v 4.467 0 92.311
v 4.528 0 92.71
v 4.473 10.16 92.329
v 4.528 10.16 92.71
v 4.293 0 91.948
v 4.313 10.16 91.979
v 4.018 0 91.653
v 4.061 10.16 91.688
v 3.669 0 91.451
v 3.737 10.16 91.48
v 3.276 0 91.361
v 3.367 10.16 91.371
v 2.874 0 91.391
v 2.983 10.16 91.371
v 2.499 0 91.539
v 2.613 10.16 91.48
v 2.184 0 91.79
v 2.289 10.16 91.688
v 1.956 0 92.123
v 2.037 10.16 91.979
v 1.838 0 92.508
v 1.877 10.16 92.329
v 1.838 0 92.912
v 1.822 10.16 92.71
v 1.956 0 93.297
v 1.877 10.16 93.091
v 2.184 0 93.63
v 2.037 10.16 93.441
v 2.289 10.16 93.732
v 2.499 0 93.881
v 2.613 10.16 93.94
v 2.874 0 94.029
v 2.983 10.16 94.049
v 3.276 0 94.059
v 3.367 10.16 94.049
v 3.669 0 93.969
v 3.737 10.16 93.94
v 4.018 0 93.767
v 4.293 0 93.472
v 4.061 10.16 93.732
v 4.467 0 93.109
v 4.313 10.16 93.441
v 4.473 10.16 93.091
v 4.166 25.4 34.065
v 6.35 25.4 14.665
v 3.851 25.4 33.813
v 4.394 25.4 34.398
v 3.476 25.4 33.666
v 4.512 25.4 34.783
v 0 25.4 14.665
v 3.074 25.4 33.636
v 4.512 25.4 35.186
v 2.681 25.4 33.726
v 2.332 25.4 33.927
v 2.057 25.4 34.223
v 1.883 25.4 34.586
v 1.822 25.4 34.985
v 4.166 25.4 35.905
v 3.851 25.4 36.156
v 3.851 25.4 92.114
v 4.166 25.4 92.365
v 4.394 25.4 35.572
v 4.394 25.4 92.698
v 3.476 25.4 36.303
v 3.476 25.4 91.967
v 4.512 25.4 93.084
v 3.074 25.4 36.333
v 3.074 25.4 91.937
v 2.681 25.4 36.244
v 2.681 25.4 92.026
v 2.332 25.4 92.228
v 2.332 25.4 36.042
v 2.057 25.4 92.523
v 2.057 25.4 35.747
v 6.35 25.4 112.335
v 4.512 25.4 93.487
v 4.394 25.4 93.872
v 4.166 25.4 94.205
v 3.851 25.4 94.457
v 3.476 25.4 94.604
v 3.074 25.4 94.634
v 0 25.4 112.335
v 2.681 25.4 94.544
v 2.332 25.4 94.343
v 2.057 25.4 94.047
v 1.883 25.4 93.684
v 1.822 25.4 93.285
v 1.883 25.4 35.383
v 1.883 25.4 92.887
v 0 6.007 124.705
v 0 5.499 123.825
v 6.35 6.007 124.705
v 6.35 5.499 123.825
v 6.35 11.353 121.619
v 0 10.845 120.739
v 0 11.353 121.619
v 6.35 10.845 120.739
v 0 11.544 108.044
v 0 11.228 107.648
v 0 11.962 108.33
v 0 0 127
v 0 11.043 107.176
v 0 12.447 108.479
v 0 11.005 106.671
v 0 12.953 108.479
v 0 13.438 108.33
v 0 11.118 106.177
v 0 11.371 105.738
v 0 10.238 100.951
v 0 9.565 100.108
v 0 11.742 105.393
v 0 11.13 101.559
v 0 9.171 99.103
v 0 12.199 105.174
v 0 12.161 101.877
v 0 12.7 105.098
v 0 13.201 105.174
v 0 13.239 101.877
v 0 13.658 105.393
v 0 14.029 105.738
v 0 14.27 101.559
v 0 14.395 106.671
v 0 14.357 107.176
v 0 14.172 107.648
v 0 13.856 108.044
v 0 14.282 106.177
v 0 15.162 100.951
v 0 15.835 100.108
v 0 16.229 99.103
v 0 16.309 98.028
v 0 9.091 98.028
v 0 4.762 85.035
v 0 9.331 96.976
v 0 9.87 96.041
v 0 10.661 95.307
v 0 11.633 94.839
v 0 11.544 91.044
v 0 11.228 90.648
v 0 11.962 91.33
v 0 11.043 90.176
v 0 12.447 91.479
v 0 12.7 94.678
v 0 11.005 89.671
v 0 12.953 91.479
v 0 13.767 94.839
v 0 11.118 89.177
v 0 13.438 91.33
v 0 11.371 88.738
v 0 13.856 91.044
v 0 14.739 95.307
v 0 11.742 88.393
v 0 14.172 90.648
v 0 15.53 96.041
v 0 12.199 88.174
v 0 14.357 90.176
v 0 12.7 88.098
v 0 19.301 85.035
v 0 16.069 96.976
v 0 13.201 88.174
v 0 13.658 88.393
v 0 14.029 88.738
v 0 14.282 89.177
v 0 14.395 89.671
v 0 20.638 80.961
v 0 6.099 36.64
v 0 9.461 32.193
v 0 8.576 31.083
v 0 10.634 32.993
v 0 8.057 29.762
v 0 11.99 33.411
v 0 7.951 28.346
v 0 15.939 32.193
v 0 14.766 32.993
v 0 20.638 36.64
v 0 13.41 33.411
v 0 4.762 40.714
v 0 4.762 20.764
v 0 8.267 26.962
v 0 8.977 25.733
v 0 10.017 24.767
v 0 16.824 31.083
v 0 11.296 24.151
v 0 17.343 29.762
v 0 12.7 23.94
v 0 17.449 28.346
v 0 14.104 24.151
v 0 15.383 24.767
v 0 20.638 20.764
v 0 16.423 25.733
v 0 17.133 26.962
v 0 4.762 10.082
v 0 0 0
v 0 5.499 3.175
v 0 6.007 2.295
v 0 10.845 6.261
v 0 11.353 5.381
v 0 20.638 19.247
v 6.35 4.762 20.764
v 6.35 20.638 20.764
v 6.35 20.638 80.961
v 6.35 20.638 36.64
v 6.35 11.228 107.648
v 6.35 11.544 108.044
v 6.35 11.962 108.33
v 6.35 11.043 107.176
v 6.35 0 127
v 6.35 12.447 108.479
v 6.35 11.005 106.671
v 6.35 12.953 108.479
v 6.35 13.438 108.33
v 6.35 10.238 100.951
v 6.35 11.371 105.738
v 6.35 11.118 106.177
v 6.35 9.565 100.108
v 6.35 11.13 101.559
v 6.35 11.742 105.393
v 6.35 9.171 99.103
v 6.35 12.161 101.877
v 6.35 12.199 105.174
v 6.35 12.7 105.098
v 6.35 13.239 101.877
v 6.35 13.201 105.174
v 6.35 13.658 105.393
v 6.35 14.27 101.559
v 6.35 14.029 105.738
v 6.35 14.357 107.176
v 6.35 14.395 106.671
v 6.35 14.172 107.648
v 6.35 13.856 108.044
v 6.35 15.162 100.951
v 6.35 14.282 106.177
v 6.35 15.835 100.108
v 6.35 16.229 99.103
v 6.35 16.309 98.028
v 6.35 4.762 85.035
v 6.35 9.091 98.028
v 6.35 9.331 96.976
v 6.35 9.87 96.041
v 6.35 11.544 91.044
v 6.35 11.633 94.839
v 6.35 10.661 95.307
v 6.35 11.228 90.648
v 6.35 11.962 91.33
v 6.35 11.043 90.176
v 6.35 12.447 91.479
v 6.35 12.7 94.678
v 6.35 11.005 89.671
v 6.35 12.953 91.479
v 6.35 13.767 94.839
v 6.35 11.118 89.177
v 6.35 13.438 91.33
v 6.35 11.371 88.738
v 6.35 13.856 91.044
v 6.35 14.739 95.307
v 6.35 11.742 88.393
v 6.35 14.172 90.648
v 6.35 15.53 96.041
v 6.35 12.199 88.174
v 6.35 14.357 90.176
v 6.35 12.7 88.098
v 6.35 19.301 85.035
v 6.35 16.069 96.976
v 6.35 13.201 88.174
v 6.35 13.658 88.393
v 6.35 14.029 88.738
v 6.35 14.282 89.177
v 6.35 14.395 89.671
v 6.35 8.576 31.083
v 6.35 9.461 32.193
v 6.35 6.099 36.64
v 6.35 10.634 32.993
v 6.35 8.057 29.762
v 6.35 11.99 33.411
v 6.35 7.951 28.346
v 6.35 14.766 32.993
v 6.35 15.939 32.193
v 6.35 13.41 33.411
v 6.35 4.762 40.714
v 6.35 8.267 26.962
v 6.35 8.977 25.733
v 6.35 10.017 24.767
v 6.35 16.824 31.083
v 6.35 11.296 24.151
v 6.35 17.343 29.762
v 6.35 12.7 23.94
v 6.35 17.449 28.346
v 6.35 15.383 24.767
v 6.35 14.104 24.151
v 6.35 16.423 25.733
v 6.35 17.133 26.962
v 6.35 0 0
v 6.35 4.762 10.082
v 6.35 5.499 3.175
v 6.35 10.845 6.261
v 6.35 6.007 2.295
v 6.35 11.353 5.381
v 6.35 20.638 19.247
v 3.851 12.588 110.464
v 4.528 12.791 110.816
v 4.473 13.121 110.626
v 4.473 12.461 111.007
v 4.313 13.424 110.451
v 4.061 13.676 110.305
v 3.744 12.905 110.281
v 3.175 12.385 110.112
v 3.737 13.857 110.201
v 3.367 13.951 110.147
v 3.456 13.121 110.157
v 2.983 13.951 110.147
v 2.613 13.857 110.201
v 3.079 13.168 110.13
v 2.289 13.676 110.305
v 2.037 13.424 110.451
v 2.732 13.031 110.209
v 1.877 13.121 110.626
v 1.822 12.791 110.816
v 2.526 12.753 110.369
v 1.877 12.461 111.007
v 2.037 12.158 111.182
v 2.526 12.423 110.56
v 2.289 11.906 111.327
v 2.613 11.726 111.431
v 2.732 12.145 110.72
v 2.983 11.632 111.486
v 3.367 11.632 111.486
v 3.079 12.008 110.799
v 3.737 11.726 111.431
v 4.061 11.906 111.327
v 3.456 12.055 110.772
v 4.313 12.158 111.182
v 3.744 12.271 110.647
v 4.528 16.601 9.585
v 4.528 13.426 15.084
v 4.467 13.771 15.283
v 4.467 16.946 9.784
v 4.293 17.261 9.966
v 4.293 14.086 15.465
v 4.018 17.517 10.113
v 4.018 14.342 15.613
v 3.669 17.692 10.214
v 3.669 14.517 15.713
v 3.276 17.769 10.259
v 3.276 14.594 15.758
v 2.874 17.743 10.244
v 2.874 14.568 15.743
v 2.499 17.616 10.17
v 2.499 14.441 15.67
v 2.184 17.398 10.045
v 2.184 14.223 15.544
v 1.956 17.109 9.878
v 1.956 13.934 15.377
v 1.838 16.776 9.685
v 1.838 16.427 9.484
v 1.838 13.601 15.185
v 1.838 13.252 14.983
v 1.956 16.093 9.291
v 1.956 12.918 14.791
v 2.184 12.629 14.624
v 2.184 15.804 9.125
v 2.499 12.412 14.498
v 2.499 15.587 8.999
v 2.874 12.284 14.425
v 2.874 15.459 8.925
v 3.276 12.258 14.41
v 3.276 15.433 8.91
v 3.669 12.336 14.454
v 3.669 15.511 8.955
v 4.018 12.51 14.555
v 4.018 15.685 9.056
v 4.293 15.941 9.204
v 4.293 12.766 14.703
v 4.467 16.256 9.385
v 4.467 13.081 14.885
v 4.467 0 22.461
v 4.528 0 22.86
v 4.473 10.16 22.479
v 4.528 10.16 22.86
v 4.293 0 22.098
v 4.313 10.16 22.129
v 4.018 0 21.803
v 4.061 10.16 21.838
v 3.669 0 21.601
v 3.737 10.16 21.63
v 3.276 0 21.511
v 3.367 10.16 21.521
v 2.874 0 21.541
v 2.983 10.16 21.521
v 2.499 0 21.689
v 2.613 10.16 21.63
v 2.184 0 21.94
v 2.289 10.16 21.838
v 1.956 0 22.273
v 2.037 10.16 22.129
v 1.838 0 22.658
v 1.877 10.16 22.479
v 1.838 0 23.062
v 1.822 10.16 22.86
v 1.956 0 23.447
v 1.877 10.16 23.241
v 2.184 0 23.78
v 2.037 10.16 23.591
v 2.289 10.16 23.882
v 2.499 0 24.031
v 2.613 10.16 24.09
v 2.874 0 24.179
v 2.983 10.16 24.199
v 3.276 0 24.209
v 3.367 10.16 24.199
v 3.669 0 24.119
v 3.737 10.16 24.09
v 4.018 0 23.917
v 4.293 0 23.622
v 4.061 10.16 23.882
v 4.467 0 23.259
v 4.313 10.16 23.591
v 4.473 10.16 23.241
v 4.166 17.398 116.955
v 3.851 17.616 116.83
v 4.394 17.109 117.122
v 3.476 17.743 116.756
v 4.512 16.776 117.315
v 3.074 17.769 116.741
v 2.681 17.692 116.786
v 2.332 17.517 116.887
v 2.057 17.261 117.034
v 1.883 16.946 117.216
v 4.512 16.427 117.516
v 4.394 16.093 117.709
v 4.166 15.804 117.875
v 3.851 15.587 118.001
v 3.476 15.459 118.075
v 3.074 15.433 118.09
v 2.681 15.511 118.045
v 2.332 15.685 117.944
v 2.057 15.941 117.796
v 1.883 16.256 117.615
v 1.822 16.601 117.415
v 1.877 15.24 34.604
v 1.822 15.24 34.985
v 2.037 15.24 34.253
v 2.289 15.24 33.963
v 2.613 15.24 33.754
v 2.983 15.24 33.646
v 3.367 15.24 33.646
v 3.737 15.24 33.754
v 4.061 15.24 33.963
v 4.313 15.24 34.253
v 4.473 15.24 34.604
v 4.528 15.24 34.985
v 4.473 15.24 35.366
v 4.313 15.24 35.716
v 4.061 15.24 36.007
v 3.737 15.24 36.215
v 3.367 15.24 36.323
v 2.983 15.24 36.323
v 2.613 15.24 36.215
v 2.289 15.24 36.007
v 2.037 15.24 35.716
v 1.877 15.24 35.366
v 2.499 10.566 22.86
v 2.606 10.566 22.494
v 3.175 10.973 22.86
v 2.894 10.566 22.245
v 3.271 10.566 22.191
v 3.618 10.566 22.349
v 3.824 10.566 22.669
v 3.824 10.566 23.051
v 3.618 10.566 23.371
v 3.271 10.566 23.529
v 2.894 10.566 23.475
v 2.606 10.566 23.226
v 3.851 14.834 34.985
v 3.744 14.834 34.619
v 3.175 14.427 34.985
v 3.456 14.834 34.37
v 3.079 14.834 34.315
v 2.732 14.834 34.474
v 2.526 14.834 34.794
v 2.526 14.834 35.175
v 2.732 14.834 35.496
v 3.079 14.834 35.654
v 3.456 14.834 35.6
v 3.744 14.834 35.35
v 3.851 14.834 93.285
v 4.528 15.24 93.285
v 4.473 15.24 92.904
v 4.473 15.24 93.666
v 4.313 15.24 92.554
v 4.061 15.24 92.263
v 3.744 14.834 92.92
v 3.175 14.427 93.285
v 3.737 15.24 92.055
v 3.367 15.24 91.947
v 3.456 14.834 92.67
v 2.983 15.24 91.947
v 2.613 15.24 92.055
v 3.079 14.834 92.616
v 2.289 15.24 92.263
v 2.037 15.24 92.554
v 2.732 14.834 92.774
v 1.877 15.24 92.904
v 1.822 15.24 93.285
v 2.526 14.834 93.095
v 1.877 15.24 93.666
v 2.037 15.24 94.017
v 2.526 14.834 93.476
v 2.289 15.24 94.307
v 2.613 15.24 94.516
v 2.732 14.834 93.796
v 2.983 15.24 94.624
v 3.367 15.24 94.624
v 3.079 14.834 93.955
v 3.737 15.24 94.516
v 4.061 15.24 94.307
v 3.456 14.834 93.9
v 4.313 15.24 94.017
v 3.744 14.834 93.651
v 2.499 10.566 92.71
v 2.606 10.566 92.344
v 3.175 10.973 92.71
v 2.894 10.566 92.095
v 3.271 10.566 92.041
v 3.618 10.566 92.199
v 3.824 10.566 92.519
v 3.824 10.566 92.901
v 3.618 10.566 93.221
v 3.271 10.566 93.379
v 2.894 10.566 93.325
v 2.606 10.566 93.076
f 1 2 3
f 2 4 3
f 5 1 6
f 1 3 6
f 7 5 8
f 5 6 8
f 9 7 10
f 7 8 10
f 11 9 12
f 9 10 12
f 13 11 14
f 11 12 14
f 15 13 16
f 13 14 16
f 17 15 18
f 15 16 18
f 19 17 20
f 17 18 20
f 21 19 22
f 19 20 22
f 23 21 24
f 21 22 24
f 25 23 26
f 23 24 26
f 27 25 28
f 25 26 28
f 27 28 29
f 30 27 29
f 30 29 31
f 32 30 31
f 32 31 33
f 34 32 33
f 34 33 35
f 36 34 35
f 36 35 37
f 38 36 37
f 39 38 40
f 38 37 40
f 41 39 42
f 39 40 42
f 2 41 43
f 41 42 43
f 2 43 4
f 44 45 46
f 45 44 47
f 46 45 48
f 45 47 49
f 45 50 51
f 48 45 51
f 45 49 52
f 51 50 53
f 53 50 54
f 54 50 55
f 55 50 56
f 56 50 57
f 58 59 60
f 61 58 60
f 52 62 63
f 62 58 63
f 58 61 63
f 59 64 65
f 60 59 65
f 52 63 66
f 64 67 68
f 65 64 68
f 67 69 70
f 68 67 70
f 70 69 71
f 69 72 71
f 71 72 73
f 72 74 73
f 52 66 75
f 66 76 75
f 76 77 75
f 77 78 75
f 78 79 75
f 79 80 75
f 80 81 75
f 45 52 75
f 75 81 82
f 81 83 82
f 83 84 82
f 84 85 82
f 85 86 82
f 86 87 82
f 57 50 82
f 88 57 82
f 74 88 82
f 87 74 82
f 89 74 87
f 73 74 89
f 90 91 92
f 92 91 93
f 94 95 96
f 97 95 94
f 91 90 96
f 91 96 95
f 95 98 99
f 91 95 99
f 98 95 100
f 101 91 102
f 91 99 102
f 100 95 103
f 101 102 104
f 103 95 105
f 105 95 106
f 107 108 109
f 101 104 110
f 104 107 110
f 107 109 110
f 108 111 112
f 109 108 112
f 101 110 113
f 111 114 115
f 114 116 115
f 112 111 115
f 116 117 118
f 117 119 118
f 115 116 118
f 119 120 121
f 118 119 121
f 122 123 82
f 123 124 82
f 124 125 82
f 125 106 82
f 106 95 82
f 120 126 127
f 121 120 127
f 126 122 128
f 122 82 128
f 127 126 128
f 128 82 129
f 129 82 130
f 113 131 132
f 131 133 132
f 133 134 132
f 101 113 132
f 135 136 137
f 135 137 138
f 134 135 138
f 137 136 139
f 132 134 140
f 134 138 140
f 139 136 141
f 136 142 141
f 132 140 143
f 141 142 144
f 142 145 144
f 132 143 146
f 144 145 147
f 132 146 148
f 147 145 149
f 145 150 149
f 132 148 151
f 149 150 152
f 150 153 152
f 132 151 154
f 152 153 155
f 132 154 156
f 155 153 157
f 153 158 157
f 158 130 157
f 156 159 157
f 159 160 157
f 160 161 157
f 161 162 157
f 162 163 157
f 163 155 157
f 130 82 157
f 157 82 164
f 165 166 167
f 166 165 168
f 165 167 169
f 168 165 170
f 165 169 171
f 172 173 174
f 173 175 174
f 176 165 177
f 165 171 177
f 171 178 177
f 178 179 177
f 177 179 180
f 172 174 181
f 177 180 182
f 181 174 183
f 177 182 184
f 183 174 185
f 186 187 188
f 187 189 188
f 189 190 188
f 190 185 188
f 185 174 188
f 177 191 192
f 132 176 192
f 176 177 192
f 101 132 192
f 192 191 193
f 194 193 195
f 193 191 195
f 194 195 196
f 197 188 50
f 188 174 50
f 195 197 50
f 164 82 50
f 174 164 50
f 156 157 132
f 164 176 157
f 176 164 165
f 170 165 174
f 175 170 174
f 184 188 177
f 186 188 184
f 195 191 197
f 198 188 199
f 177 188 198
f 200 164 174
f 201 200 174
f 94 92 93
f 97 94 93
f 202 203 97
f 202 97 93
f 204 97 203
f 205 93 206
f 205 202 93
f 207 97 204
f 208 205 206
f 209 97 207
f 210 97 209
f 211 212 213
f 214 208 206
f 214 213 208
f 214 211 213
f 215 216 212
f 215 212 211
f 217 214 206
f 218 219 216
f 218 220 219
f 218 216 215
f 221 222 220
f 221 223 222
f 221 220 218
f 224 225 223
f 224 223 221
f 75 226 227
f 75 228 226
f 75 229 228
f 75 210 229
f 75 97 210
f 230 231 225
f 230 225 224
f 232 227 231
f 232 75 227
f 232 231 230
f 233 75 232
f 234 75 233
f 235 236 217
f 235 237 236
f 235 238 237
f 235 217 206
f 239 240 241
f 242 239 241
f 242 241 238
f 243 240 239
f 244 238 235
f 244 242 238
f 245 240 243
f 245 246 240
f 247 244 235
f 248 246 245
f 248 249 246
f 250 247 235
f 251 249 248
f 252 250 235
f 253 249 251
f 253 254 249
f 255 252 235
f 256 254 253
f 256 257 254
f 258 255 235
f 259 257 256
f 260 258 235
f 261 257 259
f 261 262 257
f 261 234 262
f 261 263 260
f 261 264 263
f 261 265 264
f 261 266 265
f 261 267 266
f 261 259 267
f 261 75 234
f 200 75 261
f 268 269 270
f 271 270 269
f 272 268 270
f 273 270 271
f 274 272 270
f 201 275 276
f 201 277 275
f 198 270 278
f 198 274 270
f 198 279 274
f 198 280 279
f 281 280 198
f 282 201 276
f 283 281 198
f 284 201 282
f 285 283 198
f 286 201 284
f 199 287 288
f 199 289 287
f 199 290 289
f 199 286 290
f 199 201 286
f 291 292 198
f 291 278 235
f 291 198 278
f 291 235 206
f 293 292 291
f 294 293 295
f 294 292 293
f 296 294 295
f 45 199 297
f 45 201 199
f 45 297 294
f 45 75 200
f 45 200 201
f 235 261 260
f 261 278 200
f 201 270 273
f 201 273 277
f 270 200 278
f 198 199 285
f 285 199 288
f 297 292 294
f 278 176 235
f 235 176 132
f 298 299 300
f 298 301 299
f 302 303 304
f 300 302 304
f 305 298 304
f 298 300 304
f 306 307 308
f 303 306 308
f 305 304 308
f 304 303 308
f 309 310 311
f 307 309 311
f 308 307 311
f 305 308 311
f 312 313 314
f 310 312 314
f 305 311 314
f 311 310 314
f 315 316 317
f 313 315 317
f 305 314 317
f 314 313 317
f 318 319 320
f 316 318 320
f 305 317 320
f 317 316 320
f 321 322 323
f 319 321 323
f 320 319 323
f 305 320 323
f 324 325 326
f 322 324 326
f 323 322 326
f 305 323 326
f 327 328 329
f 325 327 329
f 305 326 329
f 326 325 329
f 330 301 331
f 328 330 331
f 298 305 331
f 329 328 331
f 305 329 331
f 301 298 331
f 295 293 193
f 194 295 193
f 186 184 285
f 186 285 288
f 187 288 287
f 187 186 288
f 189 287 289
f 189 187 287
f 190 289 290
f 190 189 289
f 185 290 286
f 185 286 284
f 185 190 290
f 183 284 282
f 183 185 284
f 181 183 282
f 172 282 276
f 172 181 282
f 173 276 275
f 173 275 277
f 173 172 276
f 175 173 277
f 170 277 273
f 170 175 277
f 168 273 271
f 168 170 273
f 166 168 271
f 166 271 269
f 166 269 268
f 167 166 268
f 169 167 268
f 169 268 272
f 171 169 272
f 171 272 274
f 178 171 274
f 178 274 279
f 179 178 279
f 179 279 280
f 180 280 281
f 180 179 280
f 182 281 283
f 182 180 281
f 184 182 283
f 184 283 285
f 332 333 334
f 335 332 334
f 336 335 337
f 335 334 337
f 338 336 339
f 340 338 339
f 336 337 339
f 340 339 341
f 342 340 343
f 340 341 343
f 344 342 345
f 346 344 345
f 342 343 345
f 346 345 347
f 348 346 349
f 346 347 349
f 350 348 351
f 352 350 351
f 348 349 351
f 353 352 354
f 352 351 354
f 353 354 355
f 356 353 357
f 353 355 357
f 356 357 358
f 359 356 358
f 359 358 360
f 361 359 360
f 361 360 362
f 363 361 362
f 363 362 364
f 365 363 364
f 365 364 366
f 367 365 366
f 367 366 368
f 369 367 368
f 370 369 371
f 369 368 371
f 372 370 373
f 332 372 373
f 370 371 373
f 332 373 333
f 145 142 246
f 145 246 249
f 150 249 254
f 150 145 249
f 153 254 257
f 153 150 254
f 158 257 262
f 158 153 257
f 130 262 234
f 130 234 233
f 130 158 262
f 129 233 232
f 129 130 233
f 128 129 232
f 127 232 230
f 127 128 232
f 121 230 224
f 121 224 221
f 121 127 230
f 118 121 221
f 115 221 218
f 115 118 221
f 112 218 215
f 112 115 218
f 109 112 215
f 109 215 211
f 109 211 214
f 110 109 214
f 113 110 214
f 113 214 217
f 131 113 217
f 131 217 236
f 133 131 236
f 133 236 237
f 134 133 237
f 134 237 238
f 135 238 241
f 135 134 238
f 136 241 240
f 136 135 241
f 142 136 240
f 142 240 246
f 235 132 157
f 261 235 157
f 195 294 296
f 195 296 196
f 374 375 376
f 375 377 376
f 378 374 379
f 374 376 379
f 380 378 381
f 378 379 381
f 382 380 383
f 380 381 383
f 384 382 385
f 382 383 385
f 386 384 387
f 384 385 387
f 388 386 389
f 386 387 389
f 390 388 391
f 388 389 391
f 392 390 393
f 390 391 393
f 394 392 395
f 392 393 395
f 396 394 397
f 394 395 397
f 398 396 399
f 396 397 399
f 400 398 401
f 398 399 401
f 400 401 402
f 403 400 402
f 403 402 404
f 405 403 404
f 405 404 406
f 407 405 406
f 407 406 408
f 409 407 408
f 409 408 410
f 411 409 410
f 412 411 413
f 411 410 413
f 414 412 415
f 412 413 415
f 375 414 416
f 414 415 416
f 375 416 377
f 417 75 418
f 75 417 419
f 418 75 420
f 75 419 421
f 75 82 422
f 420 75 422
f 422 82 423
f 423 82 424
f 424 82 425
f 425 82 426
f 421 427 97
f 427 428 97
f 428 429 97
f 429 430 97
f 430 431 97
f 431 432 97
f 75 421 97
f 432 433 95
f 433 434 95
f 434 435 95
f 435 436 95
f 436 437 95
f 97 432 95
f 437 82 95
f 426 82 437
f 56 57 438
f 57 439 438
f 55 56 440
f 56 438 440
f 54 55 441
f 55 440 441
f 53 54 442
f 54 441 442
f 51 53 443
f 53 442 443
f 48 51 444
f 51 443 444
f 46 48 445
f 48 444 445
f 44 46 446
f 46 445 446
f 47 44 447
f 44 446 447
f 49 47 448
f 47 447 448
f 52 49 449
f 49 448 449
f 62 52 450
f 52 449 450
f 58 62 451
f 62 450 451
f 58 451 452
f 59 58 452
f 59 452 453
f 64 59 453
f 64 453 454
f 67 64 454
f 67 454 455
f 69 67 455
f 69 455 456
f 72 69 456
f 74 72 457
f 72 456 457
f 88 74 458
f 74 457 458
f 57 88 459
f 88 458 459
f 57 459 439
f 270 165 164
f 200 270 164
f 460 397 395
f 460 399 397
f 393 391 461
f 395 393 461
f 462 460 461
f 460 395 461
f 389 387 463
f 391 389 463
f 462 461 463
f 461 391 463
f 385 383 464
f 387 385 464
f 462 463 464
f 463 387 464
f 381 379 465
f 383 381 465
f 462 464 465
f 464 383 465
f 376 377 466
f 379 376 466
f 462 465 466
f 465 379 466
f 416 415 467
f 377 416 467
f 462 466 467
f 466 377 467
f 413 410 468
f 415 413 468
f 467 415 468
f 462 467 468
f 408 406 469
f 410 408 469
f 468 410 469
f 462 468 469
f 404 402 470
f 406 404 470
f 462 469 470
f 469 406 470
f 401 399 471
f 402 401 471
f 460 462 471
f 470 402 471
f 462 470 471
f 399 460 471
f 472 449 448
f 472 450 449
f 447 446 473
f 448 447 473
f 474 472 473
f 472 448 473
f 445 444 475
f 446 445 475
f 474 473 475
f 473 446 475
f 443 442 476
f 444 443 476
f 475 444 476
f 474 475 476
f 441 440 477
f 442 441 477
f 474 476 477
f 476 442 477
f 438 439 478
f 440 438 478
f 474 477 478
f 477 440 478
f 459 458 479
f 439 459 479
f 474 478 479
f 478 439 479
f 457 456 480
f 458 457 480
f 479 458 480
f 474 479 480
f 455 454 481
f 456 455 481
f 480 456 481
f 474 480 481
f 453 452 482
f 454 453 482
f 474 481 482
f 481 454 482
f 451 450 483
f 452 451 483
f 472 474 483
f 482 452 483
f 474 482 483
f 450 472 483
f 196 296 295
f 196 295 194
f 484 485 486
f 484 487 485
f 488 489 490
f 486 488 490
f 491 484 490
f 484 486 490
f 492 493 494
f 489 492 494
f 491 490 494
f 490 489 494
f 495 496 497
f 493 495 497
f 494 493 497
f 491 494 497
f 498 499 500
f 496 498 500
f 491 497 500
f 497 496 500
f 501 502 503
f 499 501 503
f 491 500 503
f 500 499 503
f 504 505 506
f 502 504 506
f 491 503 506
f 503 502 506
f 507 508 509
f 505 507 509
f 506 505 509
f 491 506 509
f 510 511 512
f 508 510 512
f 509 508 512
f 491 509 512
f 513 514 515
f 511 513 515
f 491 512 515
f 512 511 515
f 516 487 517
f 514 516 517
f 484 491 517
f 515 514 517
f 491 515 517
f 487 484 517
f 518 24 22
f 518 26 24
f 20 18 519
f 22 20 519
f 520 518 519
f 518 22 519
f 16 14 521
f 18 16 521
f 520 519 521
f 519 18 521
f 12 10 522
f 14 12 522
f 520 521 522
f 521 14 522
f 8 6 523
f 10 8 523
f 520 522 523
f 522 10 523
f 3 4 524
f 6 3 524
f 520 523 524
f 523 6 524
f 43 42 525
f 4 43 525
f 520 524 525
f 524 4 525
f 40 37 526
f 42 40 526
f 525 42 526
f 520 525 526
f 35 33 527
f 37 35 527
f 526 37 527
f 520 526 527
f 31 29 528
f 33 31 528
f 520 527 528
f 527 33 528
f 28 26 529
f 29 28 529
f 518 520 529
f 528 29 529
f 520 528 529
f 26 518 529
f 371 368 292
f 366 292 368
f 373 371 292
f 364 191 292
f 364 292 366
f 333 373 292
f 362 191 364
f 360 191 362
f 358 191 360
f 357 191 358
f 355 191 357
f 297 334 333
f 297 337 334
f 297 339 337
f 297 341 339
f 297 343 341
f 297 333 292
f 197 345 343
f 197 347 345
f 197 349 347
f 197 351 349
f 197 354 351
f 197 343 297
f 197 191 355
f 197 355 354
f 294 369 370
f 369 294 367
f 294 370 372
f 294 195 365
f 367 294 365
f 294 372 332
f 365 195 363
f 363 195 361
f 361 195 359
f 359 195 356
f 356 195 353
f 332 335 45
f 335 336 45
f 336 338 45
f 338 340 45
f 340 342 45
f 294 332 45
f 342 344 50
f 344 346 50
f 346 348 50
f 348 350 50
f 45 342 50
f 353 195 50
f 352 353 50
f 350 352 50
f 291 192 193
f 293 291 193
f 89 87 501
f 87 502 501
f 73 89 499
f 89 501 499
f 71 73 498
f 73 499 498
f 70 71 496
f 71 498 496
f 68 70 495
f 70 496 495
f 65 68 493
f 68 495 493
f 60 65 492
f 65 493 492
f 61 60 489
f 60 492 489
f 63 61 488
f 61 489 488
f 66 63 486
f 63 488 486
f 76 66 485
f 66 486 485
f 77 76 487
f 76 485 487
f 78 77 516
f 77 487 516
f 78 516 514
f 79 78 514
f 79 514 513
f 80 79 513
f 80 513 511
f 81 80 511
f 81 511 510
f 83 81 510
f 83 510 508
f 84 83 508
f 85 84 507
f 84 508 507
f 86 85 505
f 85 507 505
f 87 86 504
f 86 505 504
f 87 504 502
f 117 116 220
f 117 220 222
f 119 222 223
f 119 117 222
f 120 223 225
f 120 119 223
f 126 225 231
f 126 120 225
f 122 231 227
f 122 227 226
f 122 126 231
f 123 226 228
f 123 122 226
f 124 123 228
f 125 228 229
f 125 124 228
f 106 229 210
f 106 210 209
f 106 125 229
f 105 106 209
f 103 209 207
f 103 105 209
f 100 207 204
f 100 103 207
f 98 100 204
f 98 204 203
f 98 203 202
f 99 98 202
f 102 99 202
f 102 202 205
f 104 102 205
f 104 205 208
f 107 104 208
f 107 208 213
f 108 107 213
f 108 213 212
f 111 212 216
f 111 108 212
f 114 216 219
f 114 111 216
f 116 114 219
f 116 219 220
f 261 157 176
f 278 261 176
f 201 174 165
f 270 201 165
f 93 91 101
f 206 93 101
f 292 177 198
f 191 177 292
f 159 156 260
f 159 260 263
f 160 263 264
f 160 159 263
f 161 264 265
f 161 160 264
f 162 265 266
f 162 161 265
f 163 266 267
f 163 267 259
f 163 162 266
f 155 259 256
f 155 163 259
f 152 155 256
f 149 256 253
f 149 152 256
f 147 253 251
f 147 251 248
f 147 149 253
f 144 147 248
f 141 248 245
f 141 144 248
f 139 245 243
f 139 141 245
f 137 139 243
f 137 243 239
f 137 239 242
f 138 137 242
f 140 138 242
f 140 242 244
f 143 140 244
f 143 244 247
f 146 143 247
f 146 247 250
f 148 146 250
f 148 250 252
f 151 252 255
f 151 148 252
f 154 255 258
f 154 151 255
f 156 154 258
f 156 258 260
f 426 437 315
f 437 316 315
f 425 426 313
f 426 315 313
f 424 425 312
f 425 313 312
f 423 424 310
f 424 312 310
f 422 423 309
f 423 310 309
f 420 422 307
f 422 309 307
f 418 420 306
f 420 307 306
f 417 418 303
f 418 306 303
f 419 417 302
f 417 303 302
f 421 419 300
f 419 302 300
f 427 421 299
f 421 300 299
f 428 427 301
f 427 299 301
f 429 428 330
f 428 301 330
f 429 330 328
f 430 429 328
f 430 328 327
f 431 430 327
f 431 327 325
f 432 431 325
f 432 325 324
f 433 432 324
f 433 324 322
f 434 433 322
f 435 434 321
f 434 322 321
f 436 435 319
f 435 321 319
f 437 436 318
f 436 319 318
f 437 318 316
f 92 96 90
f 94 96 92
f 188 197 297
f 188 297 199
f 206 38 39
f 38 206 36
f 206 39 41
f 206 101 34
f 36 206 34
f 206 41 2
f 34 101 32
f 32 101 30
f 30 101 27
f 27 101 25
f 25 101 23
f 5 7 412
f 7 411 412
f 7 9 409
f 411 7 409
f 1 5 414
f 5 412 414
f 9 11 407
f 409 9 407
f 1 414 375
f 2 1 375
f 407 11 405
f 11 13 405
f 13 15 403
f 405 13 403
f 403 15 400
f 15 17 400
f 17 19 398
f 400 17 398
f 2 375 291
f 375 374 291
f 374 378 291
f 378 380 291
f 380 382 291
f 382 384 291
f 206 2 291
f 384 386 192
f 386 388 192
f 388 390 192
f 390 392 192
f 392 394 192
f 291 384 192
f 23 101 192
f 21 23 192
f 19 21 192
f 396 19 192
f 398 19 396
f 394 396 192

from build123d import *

# Parameters (mm, degrees)
SKETCH1_R                     = 3.6195
SKETCH1_R_2                   = 4.7625
SKETCH1_R_3                   = 1.6999966
BOSS_EXTRUDE1_DEPTH           = 6.35
TAP_DRILL_FOR_6_32_TAP4_D     = 2.7051
TAP_DRILL_FOR_6_32_TAP4_DEPTH = 10.16
TAP_DRILL_FOR_6_32_TAP4_TIP   = 0.81269403
TAP_DRILL_FOR_6_32_TAP3_D     = 2.7051
TAP_DRILL_FOR_6_32_TAP3_DEPTH = 10.16
TAP_DRILL_FOR_6_32_TAP3_TIP   = 0.81269403
SKETCH11_W                    = 6.35
SKETCH11_H                    = 6.1722
BOSS_EXTRUDE2_DEPTH           = 1.016
SKETCH12_W                    = 6.35
SKETCH12_H                    = 6.1722
BOSS_EXTRUDE3_DEPTH           = 1.016
TAP_DRILL_FOR_6_32_TAP1_D     = 2.7051
TAP_DRILL_FOR_6_32_TAP1_DEPTH = 7.62
TAP_DRILL_FOR_6_32_TAP1_TIP   = 0.81269403
TAP_DRILL_FOR_6_32_TAP2_D     = 2.7051
TAP_DRILL_FOR_6_32_TAP2_DEPTH = 7.62
TAP_DRILL_FOR_6_32_TAP2_TIP   = 0.81269403
CUT_EXTRUDE1_DEPTH            = 130.67066939


with BuildPart() as part:
    # Sketch1 → Boss-Extrude1 (new body)
    with BuildSketch(Plane(origin=(0, 0, 0), x_dir=(0, 0, -1), z_dir=(1, 0, 0))):
        Polygon((0, 0), (-14.664696837, 25.4), (-112.335303163, 25.4), (-127, 0), align=None)
        with Locations((-98.298, 12.7)):
            Circle(SKETCH1_R, mode=Mode.SUBTRACT)
        with Locations((-28.702, 12.7)):
            Circle(SKETCH1_R_2, mode=Mode.SUBTRACT)
        with Locations((-89.7979916, 12.7)):
            Circle(SKETCH1_R_3, mode=Mode.SUBTRACT)
        with Locations((-106.7980084, 12.7)):
            Circle(SKETCH1_R_3, mode=Mode.SUBTRACT)
    extrude(amount=BOSS_EXTRUDE1_DEPTH)

    # Tap Drill for #6-32 Tap4
    with Locations(Plane(origin=(0, 25.4, 0), x_dir=(1, 0, 0), z_dir=(0, 1, 0))):
        with Locations((3.175, -93.285303163), (3.175, -34.984696837)):
            Hole(TAP_DRILL_FOR_6_32_TAP4_D / 2, depth=TAP_DRILL_FOR_6_32_TAP4_DEPTH)
            with Locations((0, 0, -(TAP_DRILL_FOR_6_32_TAP4_DEPTH + TAP_DRILL_FOR_6_32_TAP4_TIP / 2))):  # 118° drill point
                Cone(0, TAP_DRILL_FOR_6_32_TAP4_D / 2, TAP_DRILL_FOR_6_32_TAP4_TIP, mode=Mode.SUBTRACT)

    # Tap Drill for #6-32 Tap3
    with Locations(Plane(origin=(0, 0, 0), x_dir=(-1, 0, 0), z_dir=(0, -1, 0))):
        with Locations((-3.175, -92.71), (-3.175, -22.86)):
            Hole(TAP_DRILL_FOR_6_32_TAP3_D / 2, depth=TAP_DRILL_FOR_6_32_TAP3_DEPTH)
            with Locations((0, 0, -(TAP_DRILL_FOR_6_32_TAP3_DEPTH + TAP_DRILL_FOR_6_32_TAP3_TIP / 2))):  # 118° drill point
                Cone(0, TAP_DRILL_FOR_6_32_TAP3_D / 2, TAP_DRILL_FOR_6_32_TAP3_TIP, mode=Mode.SUBTRACT)

    # Sketch11 → Boss-Extrude2 (add)
    with BuildSketch(Plane(origin=(0, 54.99261314, 95.25), x_dir=(1, 0, 0), z_dir=(0, 0.5000000000000038, 0.8660254037844366))):
        with Locations((3.175, -54.0639)):
            Rectangle(SKETCH11_W, SKETCH11_H)
    extrude(amount=BOSS_EXTRUDE2_DEPTH)

    # Sketch12 → Boss-Extrude3 (add)
    with BuildSketch(Plane(origin=(0, 0, 0), x_dir=(-1, 0, 0), z_dir=(0, 0.499999999999998, -0.8660254037844397))):
        with Locations((-3.175, 9.4361)):
            Rectangle(SKETCH12_W, SKETCH12_H)
    extrude(amount=BOSS_EXTRUDE3_DEPTH)

    # Tap Drill for #6-32 Tap1
    with Locations(Plane(origin=(0, 54.99261314, 95.25), x_dir=(1, 0, 0), z_dir=(0, 0.5000000000000038, 0.8660254037844366))):
        with Locations((3.175, -44.330606325)):
            Hole(TAP_DRILL_FOR_6_32_TAP1_D / 2, depth=TAP_DRILL_FOR_6_32_TAP1_DEPTH)
            with Locations((0, 0, -(TAP_DRILL_FOR_6_32_TAP1_DEPTH + TAP_DRILL_FOR_6_32_TAP1_TIP / 2))):  # 118° drill point
                Cone(0, TAP_DRILL_FOR_6_32_TAP1_D / 2, TAP_DRILL_FOR_6_32_TAP1_TIP, mode=Mode.SUBTRACT)

    # Tap Drill for #6-32 Tap2
    with Locations(Plane(origin=(0, 0, 0), x_dir=(-1, 0, 0), z_dir=(0, 0.499999999999998, -0.8660254037844397))):
        with Locations((-3.175, 19.169393675)):
            Hole(TAP_DRILL_FOR_6_32_TAP2_D / 2, depth=TAP_DRILL_FOR_6_32_TAP2_DEPTH)
            with Locations((0, 0, -(TAP_DRILL_FOR_6_32_TAP2_DEPTH + TAP_DRILL_FOR_6_32_TAP2_TIP / 2))):  # 118° drill point
                Cone(0, TAP_DRILL_FOR_6_32_TAP2_D / 2, TAP_DRILL_FOR_6_32_TAP2_TIP, mode=Mode.SUBTRACT)

    # Sketch19 → Cut-Extrude1 (cut, through all)
    with BuildSketch(Plane.ZY):
        Polygon((80.96083814, 20.6375), (36.6395, 20.6375), (36.6395, 6.099080191), align=None)
        Polygon((85.0354916, 4.7625), (85.0354916, 19.300919809), (40.71415346, 4.7625), align=None)
        Polygon((20.7645, 20.6375), (20.7645, 4.7625), (10.081979076, 4.7625), (19.247414599, 20.6375), align=None)
    extrude(amount=-CUT_EXTRUDE1_DEPTH, mode=Mode.SUBTRACT)


solid = part.part
